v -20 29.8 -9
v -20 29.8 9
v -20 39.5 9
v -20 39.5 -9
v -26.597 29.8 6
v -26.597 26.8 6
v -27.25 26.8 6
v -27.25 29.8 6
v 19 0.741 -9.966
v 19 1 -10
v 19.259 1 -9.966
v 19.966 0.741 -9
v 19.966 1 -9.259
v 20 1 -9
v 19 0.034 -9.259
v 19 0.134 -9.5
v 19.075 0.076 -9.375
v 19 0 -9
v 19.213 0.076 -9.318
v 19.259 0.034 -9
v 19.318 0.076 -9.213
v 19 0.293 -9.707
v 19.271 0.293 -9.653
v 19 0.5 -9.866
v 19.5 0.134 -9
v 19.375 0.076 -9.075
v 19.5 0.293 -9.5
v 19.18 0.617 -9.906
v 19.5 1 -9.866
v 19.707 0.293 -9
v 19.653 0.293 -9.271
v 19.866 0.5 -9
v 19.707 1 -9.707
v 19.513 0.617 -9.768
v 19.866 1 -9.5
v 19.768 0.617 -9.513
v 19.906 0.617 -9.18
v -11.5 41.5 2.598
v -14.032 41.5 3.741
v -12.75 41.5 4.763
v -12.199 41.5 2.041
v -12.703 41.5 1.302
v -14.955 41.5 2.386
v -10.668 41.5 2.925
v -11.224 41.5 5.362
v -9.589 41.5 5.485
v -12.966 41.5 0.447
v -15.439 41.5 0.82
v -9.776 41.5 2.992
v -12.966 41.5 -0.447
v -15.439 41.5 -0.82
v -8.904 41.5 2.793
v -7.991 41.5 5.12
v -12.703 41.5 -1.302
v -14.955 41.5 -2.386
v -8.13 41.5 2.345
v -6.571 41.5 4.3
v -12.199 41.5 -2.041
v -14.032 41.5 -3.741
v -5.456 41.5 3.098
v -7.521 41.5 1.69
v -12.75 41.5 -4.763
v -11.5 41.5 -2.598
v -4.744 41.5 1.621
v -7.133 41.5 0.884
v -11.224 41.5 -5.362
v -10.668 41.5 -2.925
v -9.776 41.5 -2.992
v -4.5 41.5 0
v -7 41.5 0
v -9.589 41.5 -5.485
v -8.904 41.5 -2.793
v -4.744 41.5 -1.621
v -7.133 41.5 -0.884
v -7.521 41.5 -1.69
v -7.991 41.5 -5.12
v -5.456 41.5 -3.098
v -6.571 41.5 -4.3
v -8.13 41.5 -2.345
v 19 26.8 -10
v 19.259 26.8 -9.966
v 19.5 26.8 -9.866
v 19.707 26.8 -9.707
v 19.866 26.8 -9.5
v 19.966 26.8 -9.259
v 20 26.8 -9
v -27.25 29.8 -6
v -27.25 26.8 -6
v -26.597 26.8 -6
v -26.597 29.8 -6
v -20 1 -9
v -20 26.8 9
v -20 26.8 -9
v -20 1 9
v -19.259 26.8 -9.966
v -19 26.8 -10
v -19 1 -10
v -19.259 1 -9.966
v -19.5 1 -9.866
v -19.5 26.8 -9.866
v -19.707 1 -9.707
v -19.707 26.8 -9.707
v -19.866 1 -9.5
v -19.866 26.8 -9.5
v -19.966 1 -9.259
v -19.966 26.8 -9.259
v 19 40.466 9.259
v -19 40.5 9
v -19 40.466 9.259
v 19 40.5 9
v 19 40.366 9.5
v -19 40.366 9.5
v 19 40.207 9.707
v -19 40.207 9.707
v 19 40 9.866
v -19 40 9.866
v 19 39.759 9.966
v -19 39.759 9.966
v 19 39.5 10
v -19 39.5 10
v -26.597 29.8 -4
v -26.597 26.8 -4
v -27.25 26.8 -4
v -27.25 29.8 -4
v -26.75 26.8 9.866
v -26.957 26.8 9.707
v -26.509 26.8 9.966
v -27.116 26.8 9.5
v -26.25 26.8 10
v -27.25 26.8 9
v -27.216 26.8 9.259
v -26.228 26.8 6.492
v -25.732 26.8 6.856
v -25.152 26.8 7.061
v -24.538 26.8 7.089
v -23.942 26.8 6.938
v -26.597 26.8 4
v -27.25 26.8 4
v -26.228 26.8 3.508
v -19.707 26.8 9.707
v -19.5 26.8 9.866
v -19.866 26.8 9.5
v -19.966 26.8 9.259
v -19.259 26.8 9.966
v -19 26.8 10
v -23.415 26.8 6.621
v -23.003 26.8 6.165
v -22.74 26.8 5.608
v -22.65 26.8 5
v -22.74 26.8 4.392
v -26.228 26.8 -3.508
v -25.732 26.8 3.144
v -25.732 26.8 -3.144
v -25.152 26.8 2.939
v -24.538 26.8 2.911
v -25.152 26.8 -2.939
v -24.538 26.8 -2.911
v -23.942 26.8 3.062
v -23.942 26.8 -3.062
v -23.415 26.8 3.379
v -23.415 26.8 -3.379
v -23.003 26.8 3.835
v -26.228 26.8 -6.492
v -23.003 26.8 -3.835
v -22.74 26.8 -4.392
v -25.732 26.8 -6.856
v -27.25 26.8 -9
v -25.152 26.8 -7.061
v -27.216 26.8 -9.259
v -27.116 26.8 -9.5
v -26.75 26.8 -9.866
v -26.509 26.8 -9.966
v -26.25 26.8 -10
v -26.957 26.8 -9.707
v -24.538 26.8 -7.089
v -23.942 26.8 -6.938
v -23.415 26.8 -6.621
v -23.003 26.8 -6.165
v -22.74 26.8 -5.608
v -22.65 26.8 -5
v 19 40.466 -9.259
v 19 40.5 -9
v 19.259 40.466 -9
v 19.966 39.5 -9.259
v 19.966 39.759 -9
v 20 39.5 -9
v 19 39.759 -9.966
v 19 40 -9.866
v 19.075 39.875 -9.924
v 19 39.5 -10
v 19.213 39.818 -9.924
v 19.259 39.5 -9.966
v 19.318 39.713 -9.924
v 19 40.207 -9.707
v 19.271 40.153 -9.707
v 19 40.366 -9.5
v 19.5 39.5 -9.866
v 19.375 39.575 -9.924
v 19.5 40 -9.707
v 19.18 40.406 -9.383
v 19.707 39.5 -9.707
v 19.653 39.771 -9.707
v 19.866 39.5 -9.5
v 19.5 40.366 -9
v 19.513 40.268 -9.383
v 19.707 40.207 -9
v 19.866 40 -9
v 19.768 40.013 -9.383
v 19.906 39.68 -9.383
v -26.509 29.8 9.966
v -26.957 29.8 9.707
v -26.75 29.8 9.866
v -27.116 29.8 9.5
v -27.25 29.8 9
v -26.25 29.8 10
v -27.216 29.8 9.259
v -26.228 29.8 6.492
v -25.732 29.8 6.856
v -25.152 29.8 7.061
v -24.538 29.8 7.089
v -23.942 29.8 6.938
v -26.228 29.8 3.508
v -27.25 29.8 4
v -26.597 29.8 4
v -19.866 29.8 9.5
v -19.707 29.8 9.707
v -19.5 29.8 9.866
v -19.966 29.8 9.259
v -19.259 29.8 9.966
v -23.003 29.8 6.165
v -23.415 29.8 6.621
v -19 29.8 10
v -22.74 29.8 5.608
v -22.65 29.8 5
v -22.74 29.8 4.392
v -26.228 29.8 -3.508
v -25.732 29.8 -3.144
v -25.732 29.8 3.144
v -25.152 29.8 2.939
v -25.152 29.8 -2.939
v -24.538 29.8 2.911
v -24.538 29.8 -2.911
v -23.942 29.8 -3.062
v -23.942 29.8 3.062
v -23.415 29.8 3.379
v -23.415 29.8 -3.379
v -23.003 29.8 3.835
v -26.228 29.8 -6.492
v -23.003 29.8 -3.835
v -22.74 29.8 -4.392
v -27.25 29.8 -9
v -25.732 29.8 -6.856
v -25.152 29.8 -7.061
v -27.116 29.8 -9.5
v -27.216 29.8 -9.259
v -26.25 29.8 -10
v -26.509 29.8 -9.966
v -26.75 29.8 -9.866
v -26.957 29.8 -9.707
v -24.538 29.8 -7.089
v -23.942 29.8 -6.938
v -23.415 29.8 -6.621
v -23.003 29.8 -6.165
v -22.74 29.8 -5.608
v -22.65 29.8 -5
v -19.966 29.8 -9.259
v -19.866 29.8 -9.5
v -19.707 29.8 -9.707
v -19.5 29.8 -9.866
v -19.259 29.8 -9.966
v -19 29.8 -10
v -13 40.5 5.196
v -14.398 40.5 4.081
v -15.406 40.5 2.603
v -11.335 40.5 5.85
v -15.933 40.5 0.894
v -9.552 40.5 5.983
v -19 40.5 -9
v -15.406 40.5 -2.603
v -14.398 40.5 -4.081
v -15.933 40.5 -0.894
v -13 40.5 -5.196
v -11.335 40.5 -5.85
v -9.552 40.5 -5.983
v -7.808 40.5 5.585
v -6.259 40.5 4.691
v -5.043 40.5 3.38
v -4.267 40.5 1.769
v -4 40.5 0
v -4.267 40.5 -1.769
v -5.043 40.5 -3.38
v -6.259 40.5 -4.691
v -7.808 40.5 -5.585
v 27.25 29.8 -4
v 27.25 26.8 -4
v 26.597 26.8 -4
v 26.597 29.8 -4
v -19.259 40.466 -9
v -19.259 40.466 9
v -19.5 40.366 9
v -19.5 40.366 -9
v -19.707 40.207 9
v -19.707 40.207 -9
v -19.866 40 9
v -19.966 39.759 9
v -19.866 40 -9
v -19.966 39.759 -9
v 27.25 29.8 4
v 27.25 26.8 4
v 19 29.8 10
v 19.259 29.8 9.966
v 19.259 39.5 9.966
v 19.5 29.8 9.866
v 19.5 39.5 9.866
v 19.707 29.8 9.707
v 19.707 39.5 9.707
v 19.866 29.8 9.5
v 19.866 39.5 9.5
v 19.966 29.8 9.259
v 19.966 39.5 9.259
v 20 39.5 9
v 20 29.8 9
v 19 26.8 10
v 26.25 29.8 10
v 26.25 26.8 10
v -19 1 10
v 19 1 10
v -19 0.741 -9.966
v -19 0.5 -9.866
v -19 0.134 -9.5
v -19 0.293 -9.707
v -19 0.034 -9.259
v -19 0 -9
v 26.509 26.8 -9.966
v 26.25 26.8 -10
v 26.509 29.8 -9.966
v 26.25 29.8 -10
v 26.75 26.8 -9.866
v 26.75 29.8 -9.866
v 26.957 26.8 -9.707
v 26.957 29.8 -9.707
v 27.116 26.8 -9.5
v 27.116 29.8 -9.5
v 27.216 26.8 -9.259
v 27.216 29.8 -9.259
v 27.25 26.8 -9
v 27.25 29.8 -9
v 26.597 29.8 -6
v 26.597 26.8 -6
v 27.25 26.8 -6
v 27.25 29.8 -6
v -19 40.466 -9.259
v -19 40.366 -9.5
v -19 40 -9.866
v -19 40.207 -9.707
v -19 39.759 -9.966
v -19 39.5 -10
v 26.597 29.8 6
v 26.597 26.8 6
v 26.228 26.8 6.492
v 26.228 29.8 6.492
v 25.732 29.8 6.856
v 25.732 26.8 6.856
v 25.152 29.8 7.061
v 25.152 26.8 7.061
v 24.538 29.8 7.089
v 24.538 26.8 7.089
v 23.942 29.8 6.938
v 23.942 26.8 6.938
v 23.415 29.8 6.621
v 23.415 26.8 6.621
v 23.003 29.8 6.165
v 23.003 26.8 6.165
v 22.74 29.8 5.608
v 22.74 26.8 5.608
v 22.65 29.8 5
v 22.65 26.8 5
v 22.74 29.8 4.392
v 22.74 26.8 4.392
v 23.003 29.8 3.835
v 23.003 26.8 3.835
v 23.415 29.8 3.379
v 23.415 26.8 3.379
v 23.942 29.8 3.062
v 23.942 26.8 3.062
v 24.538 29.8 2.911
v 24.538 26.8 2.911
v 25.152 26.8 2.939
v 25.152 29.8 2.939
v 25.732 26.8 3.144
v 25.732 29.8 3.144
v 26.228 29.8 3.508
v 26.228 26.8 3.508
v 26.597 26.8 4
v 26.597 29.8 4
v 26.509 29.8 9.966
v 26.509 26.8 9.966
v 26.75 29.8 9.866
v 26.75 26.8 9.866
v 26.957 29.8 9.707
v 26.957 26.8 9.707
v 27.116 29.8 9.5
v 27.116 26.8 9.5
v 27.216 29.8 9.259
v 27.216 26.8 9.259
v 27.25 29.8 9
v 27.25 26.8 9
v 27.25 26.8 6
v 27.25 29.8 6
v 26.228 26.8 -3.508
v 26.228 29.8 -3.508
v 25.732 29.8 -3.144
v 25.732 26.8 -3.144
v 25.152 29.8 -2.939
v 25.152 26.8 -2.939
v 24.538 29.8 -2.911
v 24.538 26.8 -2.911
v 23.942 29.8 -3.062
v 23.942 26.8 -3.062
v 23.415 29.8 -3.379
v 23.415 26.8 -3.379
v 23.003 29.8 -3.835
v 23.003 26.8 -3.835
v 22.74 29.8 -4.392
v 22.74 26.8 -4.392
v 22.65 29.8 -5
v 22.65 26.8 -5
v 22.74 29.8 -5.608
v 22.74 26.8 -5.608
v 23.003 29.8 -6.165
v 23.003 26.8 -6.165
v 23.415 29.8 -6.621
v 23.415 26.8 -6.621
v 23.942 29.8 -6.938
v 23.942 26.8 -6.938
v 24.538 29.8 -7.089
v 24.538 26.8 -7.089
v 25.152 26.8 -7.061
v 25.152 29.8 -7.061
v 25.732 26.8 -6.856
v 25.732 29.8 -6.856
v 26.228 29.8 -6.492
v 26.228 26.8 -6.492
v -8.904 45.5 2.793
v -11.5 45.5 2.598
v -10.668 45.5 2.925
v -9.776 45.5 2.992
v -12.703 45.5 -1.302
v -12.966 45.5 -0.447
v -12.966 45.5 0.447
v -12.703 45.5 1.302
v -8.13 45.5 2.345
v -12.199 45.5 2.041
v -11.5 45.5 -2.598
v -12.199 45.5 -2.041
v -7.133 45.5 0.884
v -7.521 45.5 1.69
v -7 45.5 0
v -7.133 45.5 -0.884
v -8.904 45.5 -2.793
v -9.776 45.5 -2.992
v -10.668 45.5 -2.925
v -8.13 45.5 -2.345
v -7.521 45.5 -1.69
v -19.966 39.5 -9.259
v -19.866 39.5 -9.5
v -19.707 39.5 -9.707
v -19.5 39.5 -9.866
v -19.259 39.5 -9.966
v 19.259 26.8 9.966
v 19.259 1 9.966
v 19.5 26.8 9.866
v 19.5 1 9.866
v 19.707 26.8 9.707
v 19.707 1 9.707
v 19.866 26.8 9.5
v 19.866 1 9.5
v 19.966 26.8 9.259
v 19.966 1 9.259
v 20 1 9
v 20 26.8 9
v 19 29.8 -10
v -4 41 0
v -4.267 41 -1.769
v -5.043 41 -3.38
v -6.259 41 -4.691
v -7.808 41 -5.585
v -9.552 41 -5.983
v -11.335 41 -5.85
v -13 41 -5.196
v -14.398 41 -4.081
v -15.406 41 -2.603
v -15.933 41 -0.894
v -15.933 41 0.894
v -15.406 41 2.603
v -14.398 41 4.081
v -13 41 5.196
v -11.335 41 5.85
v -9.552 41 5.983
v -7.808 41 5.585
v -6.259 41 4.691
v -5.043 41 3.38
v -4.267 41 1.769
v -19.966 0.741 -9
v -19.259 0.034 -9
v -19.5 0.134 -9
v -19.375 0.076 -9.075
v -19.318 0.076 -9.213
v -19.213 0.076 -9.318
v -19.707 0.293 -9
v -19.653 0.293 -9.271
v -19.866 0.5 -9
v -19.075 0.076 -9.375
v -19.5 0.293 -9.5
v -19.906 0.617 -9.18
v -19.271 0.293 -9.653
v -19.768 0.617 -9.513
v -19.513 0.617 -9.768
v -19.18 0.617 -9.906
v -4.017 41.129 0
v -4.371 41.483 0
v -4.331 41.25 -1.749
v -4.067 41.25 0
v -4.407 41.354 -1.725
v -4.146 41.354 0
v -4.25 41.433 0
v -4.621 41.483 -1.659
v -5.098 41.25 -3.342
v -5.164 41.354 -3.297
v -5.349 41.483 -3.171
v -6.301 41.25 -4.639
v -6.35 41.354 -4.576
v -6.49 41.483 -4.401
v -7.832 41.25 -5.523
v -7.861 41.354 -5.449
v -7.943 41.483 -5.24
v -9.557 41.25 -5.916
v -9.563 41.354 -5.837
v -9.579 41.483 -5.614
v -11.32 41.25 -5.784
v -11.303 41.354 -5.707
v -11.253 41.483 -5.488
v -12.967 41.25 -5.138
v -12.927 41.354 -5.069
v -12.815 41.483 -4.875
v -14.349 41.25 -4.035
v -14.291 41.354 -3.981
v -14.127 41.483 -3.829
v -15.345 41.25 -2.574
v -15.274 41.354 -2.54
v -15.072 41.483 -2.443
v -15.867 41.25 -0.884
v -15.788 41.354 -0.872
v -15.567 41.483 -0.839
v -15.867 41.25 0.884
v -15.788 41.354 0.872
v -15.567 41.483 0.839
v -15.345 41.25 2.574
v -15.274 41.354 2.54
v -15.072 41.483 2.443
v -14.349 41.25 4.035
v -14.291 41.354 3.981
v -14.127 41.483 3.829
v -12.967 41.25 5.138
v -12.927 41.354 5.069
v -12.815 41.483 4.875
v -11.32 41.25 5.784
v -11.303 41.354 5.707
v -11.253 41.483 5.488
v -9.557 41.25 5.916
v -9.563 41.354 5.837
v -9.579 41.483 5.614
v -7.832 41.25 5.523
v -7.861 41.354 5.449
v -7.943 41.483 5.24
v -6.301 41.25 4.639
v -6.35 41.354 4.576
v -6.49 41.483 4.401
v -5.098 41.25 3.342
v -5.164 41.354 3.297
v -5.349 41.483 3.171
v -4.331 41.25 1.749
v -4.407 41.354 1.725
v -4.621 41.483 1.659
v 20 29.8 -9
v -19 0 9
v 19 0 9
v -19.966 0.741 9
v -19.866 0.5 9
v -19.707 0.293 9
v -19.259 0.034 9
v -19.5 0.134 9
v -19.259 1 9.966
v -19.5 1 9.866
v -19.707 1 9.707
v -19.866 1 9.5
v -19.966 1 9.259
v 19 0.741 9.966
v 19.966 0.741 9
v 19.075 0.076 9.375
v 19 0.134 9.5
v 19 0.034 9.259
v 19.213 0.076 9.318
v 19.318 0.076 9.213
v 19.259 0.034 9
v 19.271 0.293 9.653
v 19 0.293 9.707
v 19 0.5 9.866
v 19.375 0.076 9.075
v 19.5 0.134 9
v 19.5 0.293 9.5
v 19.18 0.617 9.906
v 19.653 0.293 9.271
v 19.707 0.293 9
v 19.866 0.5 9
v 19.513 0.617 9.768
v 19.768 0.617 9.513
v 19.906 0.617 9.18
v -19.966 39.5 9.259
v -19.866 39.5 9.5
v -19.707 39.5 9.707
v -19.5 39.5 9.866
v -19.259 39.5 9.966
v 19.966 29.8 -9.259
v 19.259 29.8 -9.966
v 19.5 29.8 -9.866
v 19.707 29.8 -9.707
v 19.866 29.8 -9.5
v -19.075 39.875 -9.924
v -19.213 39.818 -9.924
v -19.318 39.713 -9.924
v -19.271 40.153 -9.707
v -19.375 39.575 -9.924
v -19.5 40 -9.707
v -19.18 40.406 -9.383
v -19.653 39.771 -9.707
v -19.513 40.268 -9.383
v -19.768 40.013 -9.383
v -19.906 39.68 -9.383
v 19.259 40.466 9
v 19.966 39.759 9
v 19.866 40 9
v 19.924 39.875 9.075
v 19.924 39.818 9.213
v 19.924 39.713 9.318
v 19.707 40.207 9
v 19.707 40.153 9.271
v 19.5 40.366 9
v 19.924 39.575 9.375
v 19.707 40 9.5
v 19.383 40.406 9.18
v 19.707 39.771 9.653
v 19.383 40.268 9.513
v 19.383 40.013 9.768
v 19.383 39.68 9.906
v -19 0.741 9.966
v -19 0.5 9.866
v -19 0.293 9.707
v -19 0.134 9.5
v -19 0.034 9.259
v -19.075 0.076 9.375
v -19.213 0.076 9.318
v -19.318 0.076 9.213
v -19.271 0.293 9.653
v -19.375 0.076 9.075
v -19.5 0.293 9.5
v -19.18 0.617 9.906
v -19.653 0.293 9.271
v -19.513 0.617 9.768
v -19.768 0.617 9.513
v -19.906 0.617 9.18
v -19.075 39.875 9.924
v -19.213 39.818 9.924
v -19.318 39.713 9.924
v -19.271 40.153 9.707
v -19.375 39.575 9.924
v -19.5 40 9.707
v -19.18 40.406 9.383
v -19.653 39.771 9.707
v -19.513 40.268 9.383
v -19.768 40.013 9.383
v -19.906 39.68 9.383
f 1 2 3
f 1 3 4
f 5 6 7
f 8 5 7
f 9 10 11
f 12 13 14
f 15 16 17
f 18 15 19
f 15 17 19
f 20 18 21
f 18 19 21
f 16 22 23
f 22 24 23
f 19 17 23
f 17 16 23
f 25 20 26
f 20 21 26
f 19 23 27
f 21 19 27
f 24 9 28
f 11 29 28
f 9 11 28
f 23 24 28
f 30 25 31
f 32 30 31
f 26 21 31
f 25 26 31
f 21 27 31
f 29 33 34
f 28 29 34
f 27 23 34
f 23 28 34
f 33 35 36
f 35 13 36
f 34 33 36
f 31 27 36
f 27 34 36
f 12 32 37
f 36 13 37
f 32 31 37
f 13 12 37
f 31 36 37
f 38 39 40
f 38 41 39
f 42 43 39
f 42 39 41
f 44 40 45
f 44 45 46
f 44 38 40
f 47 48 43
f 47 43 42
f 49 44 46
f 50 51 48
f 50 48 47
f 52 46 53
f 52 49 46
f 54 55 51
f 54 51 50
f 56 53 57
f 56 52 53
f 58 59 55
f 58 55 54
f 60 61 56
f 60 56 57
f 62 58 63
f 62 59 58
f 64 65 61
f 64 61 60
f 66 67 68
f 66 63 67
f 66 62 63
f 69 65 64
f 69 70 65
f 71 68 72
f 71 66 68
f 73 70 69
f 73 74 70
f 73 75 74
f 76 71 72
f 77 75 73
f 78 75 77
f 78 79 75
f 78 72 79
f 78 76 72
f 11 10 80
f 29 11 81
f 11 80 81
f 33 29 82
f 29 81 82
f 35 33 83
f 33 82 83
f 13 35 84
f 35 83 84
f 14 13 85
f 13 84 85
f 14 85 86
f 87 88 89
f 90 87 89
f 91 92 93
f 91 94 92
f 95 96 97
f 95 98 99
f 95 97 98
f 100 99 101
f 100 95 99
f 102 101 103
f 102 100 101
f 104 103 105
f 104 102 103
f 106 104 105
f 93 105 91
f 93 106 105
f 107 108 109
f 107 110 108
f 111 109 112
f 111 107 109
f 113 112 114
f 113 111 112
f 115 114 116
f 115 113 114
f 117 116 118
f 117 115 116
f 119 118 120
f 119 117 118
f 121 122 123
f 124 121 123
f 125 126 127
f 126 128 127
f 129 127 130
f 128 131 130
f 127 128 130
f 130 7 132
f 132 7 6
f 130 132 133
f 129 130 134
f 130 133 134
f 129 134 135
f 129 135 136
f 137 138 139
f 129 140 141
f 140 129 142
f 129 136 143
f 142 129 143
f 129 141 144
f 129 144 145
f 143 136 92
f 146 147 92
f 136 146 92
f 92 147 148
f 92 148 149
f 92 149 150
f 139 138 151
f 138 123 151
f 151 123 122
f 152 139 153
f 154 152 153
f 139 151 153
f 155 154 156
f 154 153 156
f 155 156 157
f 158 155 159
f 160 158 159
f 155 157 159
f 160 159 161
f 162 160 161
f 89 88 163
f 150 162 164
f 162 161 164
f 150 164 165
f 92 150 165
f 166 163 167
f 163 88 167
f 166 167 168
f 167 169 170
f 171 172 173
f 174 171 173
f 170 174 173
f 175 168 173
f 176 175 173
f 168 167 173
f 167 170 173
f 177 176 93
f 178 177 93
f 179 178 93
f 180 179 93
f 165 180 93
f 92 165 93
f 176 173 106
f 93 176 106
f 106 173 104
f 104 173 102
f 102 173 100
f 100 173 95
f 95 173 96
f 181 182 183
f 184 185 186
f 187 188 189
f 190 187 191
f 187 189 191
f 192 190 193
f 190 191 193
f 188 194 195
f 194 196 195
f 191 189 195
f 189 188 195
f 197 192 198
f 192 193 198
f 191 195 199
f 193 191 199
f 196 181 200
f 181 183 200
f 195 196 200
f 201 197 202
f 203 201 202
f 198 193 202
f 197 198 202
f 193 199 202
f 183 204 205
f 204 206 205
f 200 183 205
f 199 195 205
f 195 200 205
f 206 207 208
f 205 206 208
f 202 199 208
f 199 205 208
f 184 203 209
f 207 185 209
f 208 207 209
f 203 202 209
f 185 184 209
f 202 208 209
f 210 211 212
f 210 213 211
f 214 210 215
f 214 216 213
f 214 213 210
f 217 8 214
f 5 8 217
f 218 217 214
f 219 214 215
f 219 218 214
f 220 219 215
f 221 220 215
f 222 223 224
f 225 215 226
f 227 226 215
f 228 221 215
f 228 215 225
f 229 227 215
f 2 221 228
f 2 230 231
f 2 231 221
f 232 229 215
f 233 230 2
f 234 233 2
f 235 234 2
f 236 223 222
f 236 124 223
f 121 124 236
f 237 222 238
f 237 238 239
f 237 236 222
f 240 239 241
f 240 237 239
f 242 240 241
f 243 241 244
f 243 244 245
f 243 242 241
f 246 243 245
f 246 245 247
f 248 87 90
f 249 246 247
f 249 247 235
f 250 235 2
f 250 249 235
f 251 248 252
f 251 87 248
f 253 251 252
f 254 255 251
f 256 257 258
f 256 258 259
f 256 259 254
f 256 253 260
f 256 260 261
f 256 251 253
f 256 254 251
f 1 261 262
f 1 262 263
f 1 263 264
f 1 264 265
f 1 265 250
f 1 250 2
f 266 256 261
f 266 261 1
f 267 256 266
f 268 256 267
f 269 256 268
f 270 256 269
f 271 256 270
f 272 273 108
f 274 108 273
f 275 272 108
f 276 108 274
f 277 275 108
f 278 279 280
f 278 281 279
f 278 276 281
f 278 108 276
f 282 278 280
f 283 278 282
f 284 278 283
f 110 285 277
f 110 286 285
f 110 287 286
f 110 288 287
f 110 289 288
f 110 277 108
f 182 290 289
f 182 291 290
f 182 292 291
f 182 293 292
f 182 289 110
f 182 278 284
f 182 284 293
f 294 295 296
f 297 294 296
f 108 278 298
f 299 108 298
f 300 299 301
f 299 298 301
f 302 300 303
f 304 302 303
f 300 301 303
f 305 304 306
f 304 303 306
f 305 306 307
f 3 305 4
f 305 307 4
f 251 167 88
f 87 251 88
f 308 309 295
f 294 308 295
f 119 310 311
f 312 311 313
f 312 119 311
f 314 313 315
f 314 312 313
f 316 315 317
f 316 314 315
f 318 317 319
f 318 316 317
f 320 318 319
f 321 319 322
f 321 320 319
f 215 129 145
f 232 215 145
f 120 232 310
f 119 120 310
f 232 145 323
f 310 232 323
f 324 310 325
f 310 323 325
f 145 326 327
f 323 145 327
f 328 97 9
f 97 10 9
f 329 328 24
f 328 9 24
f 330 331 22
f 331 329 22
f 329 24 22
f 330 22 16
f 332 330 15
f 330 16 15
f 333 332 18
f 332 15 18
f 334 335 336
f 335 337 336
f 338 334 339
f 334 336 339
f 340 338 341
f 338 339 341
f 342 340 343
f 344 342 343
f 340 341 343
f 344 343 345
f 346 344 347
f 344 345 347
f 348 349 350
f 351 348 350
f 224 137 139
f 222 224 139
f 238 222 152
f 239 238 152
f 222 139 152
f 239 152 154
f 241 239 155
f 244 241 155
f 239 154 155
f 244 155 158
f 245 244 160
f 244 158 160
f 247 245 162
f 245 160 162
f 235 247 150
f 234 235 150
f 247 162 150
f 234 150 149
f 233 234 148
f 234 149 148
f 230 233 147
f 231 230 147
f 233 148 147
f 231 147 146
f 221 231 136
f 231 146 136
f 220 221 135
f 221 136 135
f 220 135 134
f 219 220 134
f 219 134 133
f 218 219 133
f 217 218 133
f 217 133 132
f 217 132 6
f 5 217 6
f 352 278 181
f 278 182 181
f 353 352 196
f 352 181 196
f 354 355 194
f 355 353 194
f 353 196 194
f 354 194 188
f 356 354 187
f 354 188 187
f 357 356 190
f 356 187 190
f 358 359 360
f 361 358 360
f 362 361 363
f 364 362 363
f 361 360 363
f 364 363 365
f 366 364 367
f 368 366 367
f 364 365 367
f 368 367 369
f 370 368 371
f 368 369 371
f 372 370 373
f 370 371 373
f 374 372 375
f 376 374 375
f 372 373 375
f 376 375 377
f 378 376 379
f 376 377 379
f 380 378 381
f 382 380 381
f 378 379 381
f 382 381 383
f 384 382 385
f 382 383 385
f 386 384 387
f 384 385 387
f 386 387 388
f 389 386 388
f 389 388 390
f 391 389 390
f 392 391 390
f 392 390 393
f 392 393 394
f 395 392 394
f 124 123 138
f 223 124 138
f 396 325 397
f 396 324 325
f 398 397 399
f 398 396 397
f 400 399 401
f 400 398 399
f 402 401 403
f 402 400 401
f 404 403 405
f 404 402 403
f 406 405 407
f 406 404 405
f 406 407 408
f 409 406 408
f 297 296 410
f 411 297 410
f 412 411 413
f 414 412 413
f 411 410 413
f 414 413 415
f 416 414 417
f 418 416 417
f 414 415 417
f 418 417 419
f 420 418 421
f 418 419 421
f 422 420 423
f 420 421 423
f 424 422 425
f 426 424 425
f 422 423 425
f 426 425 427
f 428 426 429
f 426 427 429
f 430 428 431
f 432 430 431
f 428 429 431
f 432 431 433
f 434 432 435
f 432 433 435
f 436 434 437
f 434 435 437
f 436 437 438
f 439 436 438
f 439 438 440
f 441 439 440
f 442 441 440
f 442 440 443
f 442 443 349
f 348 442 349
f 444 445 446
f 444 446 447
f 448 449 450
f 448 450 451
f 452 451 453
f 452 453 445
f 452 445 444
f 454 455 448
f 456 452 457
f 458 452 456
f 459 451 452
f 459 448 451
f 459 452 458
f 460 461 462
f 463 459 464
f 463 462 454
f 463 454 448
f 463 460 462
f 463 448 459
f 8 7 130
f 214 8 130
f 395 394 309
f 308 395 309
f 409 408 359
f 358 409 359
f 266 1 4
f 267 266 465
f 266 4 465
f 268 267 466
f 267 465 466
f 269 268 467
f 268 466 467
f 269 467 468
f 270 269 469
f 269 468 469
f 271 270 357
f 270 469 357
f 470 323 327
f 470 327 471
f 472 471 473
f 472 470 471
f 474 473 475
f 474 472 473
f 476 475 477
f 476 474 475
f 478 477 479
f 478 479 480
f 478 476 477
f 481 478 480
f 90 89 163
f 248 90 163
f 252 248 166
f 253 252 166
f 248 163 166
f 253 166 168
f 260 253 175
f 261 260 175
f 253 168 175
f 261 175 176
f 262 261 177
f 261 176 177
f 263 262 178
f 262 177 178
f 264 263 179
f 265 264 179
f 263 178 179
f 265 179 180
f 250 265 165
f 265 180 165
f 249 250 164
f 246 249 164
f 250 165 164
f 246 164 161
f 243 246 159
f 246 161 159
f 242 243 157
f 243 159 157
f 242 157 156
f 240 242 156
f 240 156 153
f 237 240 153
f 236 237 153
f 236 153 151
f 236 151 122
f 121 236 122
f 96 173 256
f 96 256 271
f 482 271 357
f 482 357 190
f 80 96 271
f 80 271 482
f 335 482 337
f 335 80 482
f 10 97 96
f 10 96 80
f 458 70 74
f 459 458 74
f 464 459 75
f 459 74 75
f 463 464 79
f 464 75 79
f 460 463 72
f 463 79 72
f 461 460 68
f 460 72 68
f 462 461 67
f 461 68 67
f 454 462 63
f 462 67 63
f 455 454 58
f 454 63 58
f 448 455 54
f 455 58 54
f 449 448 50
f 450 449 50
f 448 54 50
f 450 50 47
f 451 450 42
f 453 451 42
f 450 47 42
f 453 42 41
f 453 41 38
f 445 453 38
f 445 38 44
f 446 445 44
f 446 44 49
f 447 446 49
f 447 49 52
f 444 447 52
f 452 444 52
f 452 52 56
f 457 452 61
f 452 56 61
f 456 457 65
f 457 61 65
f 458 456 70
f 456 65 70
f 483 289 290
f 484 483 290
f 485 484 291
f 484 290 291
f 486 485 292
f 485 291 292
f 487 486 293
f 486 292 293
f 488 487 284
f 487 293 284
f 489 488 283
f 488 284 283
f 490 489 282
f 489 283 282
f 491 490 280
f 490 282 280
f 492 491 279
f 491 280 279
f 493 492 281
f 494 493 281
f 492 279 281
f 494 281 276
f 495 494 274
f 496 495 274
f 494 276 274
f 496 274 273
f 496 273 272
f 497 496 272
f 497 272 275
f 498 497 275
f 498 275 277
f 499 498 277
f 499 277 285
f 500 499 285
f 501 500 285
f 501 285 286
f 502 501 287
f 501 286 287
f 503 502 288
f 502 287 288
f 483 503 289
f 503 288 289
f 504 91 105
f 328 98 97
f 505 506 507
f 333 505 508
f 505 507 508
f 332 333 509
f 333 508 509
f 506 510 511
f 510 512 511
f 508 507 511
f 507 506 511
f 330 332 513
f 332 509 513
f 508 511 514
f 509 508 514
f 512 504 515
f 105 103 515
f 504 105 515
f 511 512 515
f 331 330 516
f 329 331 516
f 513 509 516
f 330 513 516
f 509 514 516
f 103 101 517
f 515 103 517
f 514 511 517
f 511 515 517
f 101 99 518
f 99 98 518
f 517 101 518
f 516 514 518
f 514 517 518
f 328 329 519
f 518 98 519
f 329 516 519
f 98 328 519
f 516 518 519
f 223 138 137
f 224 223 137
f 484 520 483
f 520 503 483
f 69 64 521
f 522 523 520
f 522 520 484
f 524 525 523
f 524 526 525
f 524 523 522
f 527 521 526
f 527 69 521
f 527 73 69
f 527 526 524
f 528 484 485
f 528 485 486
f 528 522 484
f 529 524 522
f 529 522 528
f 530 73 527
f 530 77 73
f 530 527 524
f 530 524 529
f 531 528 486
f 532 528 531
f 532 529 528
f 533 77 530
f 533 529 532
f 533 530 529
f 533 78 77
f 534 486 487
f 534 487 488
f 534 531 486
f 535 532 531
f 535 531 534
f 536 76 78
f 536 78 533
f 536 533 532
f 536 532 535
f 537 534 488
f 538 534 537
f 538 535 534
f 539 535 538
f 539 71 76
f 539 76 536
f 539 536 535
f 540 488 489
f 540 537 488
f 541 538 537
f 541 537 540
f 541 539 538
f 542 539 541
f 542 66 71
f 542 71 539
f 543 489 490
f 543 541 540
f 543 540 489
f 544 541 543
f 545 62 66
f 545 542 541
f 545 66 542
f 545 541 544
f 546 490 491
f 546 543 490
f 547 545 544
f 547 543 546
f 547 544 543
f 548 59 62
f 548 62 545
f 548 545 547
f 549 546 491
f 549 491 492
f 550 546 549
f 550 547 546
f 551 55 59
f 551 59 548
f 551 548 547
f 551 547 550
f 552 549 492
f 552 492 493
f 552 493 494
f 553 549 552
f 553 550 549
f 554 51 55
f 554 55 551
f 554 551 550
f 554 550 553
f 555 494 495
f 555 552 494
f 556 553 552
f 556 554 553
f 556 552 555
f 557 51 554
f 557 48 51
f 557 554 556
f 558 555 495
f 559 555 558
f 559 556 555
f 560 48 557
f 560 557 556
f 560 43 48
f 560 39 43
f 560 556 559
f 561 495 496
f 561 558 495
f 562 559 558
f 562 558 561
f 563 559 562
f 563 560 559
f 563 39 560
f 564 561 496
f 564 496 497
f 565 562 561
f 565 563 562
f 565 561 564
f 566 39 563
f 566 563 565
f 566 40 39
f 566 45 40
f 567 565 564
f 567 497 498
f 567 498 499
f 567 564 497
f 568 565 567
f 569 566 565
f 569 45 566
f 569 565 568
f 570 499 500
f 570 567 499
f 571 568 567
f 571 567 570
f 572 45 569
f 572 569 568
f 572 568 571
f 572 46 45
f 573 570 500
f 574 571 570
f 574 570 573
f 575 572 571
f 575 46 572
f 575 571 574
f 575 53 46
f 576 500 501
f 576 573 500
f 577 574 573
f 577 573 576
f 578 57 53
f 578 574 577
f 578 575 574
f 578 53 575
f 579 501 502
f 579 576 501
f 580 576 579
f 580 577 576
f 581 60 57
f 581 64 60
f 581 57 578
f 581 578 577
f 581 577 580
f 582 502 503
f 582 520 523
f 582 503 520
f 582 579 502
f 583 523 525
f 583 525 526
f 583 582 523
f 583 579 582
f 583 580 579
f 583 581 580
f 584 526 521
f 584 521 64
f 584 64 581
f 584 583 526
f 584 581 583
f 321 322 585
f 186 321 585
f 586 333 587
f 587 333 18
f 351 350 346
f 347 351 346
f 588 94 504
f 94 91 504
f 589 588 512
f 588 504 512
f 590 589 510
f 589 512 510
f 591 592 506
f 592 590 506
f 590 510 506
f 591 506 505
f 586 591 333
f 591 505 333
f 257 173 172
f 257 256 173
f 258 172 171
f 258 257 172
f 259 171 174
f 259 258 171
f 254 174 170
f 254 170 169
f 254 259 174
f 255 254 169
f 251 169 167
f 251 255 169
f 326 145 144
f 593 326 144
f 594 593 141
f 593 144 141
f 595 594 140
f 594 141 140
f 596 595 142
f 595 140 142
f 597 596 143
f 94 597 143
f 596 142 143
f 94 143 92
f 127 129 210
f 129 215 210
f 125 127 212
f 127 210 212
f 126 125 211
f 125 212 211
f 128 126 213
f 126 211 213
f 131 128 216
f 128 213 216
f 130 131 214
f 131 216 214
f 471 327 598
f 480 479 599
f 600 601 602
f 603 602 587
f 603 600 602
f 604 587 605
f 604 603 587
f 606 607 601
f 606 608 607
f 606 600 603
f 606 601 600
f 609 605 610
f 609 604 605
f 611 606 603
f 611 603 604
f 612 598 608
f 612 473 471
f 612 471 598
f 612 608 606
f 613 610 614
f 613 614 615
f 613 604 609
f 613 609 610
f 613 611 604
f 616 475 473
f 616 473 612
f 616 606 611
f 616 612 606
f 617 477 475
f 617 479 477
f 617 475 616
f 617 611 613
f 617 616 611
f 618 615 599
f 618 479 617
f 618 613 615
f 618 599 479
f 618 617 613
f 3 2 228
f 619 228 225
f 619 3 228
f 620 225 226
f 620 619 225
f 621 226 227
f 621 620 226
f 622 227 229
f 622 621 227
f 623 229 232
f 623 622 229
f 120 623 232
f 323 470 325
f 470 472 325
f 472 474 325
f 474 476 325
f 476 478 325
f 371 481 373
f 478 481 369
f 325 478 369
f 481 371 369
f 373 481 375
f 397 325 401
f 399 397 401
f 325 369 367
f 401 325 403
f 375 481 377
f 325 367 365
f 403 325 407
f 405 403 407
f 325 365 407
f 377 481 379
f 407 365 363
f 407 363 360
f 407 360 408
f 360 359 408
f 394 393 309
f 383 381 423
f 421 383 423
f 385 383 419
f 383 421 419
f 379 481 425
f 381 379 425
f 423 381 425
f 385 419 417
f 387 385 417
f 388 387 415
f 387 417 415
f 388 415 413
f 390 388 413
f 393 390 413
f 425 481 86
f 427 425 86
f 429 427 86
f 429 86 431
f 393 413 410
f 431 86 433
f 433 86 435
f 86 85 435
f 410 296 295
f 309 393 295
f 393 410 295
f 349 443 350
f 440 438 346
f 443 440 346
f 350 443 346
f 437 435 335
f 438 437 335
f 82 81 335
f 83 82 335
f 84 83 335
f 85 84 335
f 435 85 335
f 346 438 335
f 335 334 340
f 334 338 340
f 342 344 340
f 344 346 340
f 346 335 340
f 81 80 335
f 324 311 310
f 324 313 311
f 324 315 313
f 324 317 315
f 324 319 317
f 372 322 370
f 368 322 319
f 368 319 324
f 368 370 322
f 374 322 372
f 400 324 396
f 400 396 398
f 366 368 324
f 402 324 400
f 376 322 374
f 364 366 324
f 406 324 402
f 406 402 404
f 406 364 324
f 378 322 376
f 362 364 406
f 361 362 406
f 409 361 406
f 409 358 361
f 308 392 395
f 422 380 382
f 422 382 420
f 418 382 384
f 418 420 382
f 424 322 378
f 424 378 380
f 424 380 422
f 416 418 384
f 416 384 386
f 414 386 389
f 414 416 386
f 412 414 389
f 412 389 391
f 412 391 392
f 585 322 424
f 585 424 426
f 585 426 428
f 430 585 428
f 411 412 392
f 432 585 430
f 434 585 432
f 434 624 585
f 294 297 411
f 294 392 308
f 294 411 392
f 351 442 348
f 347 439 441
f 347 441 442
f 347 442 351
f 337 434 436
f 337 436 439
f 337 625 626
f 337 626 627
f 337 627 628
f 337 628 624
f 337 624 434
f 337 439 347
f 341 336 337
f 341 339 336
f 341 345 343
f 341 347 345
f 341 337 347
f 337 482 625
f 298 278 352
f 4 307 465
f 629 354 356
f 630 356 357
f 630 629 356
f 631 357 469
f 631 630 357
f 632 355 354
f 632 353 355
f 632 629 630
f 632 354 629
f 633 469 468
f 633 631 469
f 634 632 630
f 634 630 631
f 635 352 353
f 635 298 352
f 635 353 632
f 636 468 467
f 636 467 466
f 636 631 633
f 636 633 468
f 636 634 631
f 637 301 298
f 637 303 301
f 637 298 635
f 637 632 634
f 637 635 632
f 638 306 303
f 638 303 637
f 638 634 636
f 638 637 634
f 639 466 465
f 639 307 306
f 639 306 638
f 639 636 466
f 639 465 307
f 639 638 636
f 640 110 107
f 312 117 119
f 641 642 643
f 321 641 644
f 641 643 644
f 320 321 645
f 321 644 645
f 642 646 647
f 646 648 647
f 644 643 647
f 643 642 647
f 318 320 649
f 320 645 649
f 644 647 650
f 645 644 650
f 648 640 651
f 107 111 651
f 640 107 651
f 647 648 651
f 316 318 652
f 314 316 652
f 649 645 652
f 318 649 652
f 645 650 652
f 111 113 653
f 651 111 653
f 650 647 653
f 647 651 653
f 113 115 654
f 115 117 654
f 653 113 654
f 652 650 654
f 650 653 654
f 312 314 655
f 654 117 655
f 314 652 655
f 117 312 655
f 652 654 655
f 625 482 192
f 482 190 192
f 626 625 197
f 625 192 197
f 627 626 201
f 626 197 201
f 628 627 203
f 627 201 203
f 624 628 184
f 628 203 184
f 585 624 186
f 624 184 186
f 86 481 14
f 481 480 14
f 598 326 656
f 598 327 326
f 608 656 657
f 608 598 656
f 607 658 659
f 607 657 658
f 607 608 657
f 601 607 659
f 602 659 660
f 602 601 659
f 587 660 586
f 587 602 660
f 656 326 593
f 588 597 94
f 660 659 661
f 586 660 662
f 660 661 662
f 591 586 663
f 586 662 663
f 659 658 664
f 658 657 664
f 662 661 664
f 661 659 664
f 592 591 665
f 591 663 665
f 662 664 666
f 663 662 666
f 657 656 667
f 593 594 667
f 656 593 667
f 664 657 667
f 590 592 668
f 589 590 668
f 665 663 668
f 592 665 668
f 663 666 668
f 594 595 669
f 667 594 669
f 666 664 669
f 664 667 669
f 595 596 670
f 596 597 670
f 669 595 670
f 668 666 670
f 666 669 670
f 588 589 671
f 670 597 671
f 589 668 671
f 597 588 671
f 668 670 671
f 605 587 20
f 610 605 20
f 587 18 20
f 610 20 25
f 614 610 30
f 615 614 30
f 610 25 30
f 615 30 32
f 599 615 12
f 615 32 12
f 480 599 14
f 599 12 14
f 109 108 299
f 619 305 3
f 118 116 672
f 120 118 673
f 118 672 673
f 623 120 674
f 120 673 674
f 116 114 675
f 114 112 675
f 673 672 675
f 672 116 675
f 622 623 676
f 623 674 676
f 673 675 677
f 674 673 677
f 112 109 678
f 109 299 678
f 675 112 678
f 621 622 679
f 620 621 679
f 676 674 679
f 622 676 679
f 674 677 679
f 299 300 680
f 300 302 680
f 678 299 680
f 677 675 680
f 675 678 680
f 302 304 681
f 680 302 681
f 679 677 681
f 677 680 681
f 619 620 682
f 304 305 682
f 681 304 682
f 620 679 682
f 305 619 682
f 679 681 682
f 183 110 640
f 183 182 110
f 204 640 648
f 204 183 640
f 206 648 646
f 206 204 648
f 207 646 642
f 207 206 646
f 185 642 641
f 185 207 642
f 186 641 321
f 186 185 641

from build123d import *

# Parameters (mm, degrees)
SKETCH1_W           = 40
SKETCH1_H           = 20
BOSS_EXTRUDE1_DEPTH = 40.5
BOSS_EXTRUDE2_DEPTH = 3
FILLET1_R           = 1
SKETCH3_R           = 6
BOSS_EXTRUDE3_DEPTH = 1
SKETCH4_R           = 3
BOSS_EXTRUDE4_DEPTH = 4
FILLET2_R           = 0.5
FILLET3_R           = 1


with BuildPart() as part:
    # Sketch1 → Boss-Extrude1 (new body)
    with BuildSketch(Plane(origin=(0, 0, 0), x_dir=(1, 0, 0), z_dir=(0, 1, 0))):
        Rectangle(SKETCH1_W, SKETCH1_H)
    extrude(amount=BOSS_EXTRUDE1_DEPTH)

    # Sketch2 → Boss-Extrude2 (add)
    with BuildSketch(Plane(origin=(0, 26.8, 0), x_dir=(1, 0, 0), z_dir=(0, 1, 0))):
        with BuildLine():
            Line((-20, -10), (-20, 10))
            Line((-20, 10), (-27.25, 10))
            Line((-27.25, 10), (-27.25, 6))
            Line((-27.25, 6), (-26.596618531, 6))
            ThreePointArc((-26.596618531, 6), (-22.65, 5), (-26.596618531, 4))
            Line((-26.596618531, 4), (-27.25, 4))
            Line((-27.25, 4), (-27.25, -4))
            Line((-27.25, -4), (-26.596618531, -4))
            ThreePointArc((-26.596618531, -4), (-22.65, -5), (-26.596618531, -6))
            Line((-26.596618531, -6), (-27.25, -6))
            Line((-27.25, -6), (-27.25, -10))
            Line((-27.25, -10), (-20, -10))
        make_face()
        with BuildLine():
            Line((27.25, 10), (20, 10))
            Line((20, 10), (20, -10))
            Line((20, -10), (27.25, -10))
            Line((27.25, -10), (27.25, -6))
            Line((27.25, -6), (26.596618531, -6))
            ThreePointArc((26.596618531, -6), (22.65, -5), (26.596618531, -4))
            Line((26.596618531, -4), (27.25, -4))
            Line((27.25, -4), (27.25, 4))
            Line((27.25, 4), (26.596618531, 4))
            ThreePointArc((26.596618531, 4), (22.65, 5), (26.596618531, 6))
            Line((26.596618531, 6), (27.25, 6))
            Line((27.25, 6), (27.25, 10))
        make_face()
    extrude(amount=BOSS_EXTRUDE2_DEPTH)

    # Fillet1
    fillet1_edges = [part.edges().sort_by_distance(p)[0] for p in [
        (-27.25, 28.3, 10),
        (-27.25, 28.3, -10),
        (27.25, 28.3, -10),
        (27.25, 28.3, 10),
    ]]
    fillet(fillet1_edges, radius=FILLET1_R)

    # Sketch3 → Boss-Extrude3 (add)
    with BuildSketch(Plane(origin=(0, 40.5, 0), x_dir=(1, 0, 0), z_dir=(0, 1, 0))):
        with Locations((-10, 0)):
            Circle(SKETCH3_R)
    extrude(amount=BOSS_EXTRUDE3_DEPTH)

    # Sketch4 → Boss-Extrude4 (add)
    with BuildSketch(Plane(origin=(0, 41.5, 0), x_dir=(1, 0, 0), z_dir=(0, 1, 0))):
        with Locations((-10, 0)):
            Circle(SKETCH4_R)
    extrude(amount=BOSS_EXTRUDE4_DEPTH)

    # Fillet2
    fillet2_edges = [part.edges().sort_by_distance(p)[0] for p in [
        (-16, 41.5, 0),
    ]]
    fillet(fillet2_edges, radius=FILLET2_R)

    # Fillet3
    fillet3_edges = [part.edges().sort_by_distance(p)[0] for p in [
        (-20, 40.5, 0),
        (0, 40.5, 10),
        (-20, 13.4, 10),
        (-20, 13.4, -10),
        (20, 13.4, -10),
        (20, 13.4, 10),
        (20, 40.5, 0),
        (0, 0, 10),
        (-20, 0, 0),
        (0, 0, -10),
        (20, 0, 0),
        (0, 40.5, -10),
        (20, 35.15, 10),
        (-20, 35.15, 10),
        (-20, 35.15, -10),
        (20, 35.15, -10),
    ]]
    fillet(fillet3_edges, radius=FILLET3_R)


solid = part.part
